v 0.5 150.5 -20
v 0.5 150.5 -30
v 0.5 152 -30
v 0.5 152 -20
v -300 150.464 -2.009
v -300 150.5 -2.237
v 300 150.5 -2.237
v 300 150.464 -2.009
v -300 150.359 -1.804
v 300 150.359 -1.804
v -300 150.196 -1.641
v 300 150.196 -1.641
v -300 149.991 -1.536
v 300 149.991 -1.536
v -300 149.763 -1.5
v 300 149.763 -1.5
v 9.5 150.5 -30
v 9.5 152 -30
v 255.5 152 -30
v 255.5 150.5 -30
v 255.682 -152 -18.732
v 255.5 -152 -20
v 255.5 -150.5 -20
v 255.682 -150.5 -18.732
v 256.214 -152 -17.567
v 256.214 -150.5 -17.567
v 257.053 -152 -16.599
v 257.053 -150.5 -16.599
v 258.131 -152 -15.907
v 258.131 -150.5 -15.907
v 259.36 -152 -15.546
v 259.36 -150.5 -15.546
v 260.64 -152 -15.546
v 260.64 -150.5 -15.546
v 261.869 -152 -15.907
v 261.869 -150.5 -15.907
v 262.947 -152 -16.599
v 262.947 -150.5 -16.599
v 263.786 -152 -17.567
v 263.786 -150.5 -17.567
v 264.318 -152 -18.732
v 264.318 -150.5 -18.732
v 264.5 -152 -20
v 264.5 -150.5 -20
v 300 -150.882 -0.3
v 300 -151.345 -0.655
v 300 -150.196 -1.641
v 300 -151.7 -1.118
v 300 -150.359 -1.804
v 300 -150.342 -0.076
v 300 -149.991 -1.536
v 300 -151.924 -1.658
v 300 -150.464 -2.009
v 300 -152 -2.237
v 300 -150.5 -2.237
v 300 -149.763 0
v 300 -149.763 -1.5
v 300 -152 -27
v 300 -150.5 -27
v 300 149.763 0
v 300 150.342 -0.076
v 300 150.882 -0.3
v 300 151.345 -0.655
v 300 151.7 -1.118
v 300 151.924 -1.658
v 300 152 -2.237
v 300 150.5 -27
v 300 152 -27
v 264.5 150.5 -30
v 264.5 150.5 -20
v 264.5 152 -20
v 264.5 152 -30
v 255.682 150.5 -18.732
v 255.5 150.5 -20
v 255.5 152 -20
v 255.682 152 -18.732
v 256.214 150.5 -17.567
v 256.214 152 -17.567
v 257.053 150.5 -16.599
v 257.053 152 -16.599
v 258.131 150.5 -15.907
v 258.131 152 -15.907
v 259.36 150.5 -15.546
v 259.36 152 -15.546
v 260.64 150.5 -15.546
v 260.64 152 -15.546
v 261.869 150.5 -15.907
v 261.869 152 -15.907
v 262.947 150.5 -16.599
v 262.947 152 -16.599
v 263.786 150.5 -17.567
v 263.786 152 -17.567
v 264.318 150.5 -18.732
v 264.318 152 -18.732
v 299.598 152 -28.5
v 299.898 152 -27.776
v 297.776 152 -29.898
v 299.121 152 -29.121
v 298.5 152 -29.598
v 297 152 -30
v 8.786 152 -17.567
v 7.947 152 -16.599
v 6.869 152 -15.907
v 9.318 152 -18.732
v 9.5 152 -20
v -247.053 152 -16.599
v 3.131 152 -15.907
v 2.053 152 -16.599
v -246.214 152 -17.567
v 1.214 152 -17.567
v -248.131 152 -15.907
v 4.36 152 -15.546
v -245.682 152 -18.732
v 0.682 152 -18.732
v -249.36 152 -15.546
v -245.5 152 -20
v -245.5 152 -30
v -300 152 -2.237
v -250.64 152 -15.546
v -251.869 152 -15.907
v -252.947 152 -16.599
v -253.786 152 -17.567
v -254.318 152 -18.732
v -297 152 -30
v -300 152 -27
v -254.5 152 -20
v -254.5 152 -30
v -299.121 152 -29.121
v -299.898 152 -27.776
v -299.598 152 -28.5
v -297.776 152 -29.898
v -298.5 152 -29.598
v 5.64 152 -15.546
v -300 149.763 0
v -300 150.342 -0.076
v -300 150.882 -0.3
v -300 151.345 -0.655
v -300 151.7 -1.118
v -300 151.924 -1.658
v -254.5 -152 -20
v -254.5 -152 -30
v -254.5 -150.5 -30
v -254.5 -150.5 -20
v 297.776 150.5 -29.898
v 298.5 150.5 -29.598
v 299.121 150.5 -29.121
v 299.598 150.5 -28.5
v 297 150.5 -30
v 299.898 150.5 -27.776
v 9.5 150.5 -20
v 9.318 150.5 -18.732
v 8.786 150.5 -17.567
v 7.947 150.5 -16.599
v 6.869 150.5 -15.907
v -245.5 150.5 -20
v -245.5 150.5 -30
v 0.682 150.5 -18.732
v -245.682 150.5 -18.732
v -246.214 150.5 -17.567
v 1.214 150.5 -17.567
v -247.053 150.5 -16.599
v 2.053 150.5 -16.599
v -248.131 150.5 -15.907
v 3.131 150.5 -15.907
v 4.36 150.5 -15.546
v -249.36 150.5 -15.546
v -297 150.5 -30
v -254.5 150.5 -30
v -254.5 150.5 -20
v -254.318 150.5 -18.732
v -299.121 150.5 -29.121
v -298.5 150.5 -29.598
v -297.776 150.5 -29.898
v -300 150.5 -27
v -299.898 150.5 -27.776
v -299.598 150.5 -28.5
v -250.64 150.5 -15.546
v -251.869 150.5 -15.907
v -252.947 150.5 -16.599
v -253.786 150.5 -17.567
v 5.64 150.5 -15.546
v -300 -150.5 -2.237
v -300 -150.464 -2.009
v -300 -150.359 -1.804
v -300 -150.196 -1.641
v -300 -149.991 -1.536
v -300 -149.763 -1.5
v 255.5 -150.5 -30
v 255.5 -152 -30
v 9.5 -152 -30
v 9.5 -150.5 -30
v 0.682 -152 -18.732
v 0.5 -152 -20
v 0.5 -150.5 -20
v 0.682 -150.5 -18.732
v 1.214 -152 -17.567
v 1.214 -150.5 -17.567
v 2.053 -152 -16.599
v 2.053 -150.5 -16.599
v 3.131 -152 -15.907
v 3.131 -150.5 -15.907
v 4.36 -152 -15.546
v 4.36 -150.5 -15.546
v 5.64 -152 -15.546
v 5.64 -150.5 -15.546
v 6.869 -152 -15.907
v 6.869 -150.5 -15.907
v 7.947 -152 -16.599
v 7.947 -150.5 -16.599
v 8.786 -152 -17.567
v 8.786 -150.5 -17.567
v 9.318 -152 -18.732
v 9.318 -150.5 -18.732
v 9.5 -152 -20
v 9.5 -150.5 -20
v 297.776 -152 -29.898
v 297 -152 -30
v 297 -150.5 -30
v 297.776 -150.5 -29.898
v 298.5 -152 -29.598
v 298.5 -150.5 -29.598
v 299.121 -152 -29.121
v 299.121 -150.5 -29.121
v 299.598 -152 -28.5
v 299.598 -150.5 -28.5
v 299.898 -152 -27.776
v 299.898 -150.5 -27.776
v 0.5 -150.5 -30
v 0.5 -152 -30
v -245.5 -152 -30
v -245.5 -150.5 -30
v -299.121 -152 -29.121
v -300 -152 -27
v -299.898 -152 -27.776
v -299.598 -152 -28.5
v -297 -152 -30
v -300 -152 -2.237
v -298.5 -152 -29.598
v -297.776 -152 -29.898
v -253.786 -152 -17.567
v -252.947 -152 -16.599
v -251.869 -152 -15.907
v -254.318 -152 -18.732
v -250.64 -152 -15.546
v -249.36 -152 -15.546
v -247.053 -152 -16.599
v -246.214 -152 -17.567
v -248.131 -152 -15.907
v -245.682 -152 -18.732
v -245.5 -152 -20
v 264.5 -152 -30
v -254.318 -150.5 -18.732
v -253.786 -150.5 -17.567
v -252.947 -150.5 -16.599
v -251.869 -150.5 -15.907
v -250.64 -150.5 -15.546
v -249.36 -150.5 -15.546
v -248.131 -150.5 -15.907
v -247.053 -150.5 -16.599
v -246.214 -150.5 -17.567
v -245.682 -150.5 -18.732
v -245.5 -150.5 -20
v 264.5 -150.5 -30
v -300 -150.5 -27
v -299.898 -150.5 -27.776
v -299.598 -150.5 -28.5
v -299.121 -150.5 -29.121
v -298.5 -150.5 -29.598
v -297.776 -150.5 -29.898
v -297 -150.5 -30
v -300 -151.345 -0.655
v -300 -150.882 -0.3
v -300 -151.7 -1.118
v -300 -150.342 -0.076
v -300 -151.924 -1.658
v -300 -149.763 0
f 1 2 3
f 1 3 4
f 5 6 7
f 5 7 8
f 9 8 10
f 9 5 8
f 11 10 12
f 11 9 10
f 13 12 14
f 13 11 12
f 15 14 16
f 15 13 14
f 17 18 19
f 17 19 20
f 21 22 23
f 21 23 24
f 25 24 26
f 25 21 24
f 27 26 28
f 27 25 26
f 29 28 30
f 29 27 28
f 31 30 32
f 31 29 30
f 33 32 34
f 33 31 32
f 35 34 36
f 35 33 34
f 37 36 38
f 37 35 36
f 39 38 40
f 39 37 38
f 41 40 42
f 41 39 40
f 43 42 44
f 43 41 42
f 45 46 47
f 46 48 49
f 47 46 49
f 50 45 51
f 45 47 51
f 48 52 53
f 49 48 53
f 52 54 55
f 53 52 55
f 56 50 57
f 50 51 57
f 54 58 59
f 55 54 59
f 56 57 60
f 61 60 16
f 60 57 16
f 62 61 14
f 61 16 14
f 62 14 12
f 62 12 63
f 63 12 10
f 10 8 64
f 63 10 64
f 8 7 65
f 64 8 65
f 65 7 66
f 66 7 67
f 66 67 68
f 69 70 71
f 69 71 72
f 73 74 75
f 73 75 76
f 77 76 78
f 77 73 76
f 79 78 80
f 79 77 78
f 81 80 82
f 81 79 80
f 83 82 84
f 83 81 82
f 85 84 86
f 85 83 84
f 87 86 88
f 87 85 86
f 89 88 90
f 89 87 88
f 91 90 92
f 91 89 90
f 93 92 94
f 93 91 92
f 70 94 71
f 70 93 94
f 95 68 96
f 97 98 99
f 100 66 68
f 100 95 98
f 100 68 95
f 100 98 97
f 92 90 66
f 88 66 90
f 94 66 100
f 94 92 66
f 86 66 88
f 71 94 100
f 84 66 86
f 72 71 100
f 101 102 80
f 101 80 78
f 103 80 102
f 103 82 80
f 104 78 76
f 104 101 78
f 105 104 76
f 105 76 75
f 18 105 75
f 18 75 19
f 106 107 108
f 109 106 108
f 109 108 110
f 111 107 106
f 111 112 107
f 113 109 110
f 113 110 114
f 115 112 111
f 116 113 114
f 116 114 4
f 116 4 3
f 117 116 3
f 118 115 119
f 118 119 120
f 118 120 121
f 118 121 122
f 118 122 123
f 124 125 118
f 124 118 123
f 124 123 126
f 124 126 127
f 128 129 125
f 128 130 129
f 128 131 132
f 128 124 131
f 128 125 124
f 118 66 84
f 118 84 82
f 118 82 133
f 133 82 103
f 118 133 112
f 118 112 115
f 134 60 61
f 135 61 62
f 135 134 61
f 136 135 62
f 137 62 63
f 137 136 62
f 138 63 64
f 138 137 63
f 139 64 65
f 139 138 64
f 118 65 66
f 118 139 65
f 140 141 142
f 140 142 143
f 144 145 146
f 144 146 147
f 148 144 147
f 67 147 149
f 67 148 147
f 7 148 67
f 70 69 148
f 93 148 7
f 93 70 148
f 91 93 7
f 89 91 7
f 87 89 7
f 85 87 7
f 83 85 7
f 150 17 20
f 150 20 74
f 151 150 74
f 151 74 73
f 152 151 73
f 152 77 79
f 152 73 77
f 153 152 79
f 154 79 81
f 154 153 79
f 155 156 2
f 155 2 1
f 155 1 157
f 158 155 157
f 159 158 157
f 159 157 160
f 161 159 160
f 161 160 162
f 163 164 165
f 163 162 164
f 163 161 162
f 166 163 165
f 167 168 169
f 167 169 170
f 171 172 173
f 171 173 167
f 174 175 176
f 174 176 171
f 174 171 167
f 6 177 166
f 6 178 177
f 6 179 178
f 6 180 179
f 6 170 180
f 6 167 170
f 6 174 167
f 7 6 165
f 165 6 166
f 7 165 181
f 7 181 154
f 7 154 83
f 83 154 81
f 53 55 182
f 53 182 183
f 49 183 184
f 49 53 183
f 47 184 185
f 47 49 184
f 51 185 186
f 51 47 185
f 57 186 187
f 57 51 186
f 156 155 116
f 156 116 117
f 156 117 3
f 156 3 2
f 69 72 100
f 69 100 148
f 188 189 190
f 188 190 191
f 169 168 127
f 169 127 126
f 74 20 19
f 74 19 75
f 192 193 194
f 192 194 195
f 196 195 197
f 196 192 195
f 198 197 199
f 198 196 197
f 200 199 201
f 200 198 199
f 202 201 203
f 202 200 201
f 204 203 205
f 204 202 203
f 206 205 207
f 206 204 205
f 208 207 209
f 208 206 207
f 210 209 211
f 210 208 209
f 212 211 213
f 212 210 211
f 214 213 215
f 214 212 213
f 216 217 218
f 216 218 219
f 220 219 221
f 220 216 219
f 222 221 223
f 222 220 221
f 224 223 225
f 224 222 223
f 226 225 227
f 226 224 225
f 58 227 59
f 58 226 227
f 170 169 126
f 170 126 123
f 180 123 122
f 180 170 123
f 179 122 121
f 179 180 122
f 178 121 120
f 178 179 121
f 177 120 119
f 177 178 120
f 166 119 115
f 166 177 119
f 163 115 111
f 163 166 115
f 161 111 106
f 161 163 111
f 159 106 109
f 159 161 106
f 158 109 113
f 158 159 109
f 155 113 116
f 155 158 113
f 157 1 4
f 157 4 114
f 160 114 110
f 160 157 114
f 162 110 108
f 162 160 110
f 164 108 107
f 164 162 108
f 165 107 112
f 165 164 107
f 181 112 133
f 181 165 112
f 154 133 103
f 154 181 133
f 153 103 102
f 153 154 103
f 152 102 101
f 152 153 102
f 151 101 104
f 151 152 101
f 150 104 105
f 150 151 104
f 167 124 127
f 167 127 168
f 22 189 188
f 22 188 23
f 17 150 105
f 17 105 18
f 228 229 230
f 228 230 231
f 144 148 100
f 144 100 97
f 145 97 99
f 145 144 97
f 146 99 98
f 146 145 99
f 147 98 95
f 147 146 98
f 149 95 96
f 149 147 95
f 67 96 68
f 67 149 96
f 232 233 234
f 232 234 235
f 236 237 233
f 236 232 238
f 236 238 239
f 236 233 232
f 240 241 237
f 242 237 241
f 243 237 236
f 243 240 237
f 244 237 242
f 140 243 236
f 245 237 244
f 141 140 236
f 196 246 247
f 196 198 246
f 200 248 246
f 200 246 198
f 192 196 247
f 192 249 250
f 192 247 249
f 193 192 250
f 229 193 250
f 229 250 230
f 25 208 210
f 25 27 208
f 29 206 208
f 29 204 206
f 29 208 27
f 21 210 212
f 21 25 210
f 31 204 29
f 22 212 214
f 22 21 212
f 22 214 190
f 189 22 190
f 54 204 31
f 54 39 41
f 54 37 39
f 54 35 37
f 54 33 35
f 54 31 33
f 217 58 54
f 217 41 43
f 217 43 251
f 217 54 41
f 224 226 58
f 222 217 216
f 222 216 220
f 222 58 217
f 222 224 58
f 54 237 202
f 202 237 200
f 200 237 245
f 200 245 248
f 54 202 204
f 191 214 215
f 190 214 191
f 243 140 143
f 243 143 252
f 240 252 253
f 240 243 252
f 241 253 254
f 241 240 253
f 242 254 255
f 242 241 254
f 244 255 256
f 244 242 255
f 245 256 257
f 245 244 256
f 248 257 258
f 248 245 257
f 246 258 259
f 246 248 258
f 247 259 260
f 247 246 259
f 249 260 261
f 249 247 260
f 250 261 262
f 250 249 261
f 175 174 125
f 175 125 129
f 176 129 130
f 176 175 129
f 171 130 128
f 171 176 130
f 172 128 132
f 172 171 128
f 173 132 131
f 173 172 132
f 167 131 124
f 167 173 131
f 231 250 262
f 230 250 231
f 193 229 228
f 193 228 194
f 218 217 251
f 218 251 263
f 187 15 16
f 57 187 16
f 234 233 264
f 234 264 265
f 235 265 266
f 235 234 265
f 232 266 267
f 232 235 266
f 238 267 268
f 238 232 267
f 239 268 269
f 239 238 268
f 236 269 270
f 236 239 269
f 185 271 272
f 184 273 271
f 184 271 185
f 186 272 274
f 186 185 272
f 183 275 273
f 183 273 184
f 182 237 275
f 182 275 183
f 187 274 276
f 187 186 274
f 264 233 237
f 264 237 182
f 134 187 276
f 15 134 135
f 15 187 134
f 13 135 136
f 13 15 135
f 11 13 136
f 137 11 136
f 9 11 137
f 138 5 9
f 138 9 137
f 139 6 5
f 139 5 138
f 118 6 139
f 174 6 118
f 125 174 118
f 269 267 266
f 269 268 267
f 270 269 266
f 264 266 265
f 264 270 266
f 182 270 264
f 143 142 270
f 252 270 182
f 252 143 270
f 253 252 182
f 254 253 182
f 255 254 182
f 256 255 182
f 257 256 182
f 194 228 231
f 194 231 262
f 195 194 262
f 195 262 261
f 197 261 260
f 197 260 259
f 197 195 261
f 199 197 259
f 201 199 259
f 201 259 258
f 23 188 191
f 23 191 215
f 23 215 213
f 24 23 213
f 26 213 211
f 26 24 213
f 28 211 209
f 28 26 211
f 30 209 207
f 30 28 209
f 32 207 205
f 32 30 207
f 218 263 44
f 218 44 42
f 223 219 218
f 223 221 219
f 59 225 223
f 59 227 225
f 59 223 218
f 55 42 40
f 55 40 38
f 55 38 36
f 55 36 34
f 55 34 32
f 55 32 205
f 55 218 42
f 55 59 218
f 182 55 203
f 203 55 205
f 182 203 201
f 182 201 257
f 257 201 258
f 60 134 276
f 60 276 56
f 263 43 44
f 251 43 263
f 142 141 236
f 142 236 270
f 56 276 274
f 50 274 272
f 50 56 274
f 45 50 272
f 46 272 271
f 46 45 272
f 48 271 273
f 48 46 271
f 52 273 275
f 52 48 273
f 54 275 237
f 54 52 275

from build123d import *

# Parameters (mm, degrees)
SKETCH_1_W                         = 600
SKETCH_1_H                         = 304
SM_BASE_FLANGE_1_DEPTH             = 1.5
SM_EDGE_FLANGE_1_STRIP_W           = 7.4732
SM_EDGE_FLANGE_1_STRIP_H           = 1.5
SM_EDGE_FLANGE_1_STRIP_CUT_DEPTH   = 600
SM_EDGE_FLANGE_1_STRIP_2_W         = 7.4732
SM_EDGE_FLANGE_1_STRIP_2_H         = 1.5
SM_EDGE_FLANGE_1_STRIP_CUT_2_DEPTH = 600
SM_EDGE_FLANGE_1_DEPTH             = 600
SM_EDGE_FLANGE_1_BEND_DEPTH        = 600
OTHER_START                        = -152
OTHER_1_DEPTH                      = 304
CUT_EXTRUDE_1_DEPTH                = 429.154177838
PATTERN_LINEAR_1_COUNT             = 3
PATTERN_LINEAR_1_PITCH             = 255


# Read off the part's stored shape, not the designer's step: 断开-边角1
# Sheet-metal steps are written as plain solids
with BuildPart() as part:
    # Sketch 1 → 基体-法兰1 (new body)
    with BuildSketch(Plane.XY):
        Rectangle(SKETCH_1_W, SKETCH_1_H)
    extrude(amount=-SM_BASE_FLANGE_1_DEPTH)

    # 边线-法兰1 strip (across the edge) → 边线-法兰1 strip cut (cut)
    with BuildSketch(Plane(origin=(300, -152, -1.5), x_dir=(0, 1, 0), z_dir=(-1, 0, 0))):
        with Locations((-1.5, -0.75)):
            Rectangle(SM_EDGE_FLANGE_1_STRIP_W, SM_EDGE_FLANGE_1_STRIP_H)
    extrude(amount=SM_EDGE_FLANGE_1_STRIP_CUT_DEPTH, mode=Mode.SUBTRACT)

    # 边线-法兰1 strip 2 (across the edge) → 边线-法兰1 strip cut 2 (cut)
    with BuildSketch(Plane(origin=(-300, 152, -1.5), x_dir=(0, -1, 0), z_dir=(1, 0, 0))):
        with Locations((-1.5, -0.75)):
            Rectangle(SM_EDGE_FLANGE_1_STRIP_2_W, SM_EDGE_FLANGE_1_STRIP_2_H)
    extrude(amount=SM_EDGE_FLANGE_1_STRIP_CUT_2_DEPTH, mode=Mode.SUBTRACT)

    # 边线-法兰1 section (across the edge) → 边线-法兰1 (add)
    with BuildSketch(Plane(origin=(300, -152, -1.5), x_dir=(0, 1, 0), z_dir=(-1, 0, 0))):
        with BuildLine():
            Line((0, 0.7366), (0, 28.5))
            Line((0, 28.5), (1.5, 28.5))
            Line((1.5, 28.5), (1.5, 0.7366))
            ThreePointArc((1.5, 0.7366), (1.715745145, 0.215745145), (2.2366, 0))
            Line((2.2366, 0), (2.2366, -1.5))
            ThreePointArc((2.2366, -1.5), (0.655084973, -0.844915027), (0, 0.7366))
        make_face()
    extrude(amount=SM_EDGE_FLANGE_1_DEPTH)

    # 边线-法兰1 section 2 (across the edge) → 边线-法兰1 bend (add)
    with BuildSketch(Plane(origin=(-300, 152, -1.5), x_dir=(0, -1, 0), z_dir=(1, 0, 0))):
        with BuildLine():
            Line((0, 0.7366), (0, 28.5))
            Line((0, 28.5), (1.5, 28.5))
            Line((1.5, 28.5), (1.5, 0.7366))
            ThreePointArc((1.5, 0.7366), (1.715745145, 0.215745145), (2.2366, 0))
            Line((2.2366, 0), (2.2366, -1.5))
            ThreePointArc((2.2366, -1.5), (0.655084973, -0.844915027), (0, 0.7366))
        make_face()
    extrude(amount=SM_EDGE_FLANGE_1_BEND_DEPTH)

    # Other 1 outline → Other 1 (cut)
    with BuildSketch(Plane(origin=(0, 0, 0), x_dir=(1, 0, 0), z_dir=(0, 1, 0)).offset(OTHER_START)):
        with BuildLine():
            Line((-300, 30), (-300, 27))
            ThreePointArc((-300, 27), (-299.121320344, 29.121320344), (-297, 30))
            Line((-297, 30), (-300, 30))
        make_face()
        with BuildLine():
            Line((300, 30), (297, 30))
            ThreePointArc((297, 30), (299.121320344, 29.121320344), (300, 27))
            Line((300, 27), (300, 30))
        make_face()
    extrude(amount=OTHER_1_DEPTH, mode=Mode.SUBTRACT)

    # 草图12 → 切除-拉伸1 (cut, symmetric)
    with BuildSketch(Plane.XZ.offset(152)):
        with BuildLine():
            Line((-254.5, -30), (-254.5, -20))
            ThreePointArc((-254.5, -20), (-250, -15.5), (-245.5, -20))
            Line((-245.5, -20), (-245.5, -30))
            ThreePointArc((-245.5, -30), (-250, -34.5), (-254.5, -30))
        make_face()
    cut_extrude_1 = extrude(amount=CUT_EXTRUDE_1_DEPTH, both=True, mode=Mode.SUBTRACT)

    # 阵列(线性)1: 切除-拉伸1 ×3
    with Locations(*[(i * PATTERN_LINEAR_1_PITCH, 0, 0) for i in range(1, PATTERN_LINEAR_1_COUNT)]):
        add(cut_extrude_1, mode=Mode.SUBTRACT)


solid = part.part
